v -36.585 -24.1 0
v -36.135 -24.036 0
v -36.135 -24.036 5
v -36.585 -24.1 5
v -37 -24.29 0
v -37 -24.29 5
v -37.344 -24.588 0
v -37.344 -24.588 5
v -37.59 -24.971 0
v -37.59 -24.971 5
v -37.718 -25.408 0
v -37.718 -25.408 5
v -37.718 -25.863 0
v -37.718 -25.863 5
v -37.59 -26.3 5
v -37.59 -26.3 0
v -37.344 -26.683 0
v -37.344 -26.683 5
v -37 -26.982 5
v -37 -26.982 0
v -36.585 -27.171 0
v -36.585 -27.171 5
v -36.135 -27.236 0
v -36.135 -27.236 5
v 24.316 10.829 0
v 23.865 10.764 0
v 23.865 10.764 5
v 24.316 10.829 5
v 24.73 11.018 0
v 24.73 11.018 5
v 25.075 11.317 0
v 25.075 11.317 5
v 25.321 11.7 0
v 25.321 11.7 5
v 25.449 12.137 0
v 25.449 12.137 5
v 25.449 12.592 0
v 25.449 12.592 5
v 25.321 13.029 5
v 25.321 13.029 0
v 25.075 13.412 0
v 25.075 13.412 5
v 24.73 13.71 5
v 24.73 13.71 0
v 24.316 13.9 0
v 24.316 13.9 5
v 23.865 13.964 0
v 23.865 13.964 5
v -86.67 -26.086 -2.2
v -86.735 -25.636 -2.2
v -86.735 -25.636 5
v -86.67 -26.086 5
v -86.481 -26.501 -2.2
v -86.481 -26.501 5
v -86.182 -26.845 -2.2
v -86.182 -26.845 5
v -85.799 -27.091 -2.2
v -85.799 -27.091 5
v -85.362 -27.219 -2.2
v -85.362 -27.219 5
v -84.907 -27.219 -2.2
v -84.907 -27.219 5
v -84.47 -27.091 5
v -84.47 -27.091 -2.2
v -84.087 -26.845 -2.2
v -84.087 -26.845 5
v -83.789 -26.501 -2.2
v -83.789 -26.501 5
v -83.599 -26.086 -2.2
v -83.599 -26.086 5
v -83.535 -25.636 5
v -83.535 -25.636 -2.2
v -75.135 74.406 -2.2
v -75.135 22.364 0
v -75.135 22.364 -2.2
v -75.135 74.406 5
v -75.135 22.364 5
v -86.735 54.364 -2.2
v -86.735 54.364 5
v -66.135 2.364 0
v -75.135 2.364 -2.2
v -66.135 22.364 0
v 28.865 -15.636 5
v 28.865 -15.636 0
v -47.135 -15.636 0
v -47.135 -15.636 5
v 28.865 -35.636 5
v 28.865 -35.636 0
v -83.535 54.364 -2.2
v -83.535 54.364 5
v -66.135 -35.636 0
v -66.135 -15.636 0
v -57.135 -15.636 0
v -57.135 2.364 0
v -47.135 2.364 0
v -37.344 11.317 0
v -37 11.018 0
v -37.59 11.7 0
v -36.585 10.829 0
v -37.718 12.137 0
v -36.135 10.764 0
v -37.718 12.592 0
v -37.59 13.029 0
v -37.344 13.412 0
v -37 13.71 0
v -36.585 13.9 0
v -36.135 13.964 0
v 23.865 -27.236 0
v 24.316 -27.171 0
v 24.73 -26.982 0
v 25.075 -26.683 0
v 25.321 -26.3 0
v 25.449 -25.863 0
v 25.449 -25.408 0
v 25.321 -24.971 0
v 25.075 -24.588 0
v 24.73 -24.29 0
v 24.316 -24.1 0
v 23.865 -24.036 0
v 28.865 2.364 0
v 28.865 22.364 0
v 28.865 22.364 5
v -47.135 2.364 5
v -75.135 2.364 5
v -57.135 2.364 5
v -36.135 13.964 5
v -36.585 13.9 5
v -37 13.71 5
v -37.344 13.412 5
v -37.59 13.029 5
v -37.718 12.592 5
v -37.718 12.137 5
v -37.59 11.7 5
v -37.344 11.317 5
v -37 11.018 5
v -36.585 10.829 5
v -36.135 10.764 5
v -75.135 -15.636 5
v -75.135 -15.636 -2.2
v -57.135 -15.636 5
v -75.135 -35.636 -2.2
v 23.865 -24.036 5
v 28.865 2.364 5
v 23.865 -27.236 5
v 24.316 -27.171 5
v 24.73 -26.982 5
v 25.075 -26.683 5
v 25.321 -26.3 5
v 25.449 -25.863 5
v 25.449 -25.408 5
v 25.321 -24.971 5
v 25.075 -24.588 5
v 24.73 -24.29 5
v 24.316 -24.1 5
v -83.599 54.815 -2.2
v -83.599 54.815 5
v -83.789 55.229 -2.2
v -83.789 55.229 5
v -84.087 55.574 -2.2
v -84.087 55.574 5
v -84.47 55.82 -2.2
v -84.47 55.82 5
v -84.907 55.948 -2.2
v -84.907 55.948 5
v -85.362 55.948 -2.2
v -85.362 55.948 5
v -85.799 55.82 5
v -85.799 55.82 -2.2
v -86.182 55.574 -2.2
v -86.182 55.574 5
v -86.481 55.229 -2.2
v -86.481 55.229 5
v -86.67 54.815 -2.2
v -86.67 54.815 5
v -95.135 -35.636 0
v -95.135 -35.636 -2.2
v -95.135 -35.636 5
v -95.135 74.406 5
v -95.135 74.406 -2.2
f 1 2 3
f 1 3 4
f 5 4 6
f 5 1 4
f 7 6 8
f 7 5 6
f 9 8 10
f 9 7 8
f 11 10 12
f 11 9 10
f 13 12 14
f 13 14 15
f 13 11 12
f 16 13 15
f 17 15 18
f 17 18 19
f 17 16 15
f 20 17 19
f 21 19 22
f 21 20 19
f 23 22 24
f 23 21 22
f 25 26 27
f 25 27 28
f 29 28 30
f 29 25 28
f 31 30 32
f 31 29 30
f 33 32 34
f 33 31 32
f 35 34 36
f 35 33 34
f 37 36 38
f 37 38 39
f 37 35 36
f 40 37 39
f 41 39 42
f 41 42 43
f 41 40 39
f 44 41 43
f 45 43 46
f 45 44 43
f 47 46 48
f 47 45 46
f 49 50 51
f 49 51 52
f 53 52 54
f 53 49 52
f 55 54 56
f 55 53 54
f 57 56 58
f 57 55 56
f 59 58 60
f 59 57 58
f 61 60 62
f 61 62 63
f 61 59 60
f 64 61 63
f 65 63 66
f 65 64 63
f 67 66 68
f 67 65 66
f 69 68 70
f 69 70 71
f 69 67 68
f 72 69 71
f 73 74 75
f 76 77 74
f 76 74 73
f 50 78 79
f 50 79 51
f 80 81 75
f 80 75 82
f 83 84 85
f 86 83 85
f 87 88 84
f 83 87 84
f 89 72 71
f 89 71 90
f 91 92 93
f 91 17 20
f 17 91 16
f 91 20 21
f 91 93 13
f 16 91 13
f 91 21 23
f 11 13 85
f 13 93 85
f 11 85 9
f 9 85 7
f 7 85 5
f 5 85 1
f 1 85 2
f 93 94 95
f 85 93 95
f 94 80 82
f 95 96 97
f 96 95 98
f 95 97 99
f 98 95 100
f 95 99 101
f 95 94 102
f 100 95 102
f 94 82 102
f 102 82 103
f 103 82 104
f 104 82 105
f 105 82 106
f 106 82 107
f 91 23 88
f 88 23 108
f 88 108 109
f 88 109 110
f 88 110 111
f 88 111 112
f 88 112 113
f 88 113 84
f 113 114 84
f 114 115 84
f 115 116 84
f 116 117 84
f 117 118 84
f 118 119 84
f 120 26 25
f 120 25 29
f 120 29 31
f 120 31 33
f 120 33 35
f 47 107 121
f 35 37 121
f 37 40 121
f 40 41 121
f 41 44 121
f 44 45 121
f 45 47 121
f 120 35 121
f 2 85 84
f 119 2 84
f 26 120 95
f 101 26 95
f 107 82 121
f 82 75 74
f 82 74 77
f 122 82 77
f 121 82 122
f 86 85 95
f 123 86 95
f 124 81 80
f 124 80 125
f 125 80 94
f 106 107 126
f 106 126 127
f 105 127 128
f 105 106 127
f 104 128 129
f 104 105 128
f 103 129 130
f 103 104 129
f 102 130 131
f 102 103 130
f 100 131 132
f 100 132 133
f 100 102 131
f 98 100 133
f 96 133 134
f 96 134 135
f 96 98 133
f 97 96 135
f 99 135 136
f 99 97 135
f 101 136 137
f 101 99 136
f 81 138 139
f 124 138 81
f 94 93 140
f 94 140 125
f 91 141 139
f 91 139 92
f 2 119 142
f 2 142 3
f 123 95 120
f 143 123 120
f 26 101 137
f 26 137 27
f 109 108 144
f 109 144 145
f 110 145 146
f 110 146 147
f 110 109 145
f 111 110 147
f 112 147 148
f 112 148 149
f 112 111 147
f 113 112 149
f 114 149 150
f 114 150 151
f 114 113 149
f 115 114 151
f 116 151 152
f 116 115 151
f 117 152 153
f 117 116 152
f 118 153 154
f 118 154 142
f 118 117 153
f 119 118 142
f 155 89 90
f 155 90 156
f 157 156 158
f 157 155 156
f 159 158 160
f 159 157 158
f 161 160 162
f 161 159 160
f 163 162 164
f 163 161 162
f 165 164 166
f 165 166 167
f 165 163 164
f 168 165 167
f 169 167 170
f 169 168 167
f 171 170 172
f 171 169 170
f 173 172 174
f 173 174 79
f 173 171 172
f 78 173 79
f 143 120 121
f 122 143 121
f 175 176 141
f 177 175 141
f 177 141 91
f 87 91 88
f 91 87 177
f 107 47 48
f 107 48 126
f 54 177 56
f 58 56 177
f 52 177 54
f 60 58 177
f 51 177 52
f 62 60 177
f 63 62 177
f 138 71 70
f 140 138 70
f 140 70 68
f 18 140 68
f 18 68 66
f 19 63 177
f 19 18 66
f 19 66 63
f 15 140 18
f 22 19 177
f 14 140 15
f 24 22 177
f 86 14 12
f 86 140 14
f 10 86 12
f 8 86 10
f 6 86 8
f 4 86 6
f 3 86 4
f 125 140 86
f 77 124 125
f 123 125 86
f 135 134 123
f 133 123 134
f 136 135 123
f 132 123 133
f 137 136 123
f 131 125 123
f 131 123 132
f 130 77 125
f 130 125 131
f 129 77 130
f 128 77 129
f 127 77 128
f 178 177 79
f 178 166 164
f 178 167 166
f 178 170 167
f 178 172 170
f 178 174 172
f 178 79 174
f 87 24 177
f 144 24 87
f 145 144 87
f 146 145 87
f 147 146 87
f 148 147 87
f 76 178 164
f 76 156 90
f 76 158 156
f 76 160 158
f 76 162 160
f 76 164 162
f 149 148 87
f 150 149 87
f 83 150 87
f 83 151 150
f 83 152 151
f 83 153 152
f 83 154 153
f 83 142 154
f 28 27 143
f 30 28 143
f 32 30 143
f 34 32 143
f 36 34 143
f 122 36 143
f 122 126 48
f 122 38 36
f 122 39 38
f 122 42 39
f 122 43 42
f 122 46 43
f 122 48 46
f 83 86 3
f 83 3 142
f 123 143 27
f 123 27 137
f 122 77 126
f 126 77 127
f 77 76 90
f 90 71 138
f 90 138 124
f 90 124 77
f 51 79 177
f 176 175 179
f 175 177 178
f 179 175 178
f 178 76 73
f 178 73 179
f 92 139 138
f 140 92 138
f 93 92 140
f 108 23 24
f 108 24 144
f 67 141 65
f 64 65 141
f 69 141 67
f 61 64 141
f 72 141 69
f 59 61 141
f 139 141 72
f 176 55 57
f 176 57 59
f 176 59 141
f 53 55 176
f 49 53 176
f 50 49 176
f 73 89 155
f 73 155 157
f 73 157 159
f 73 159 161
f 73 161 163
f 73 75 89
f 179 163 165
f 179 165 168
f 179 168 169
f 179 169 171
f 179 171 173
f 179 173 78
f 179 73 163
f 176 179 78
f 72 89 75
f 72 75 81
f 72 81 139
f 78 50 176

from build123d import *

# Parameters (mm, degrees)
SKETCH_1_W                  = 76
SKETCH_1_H                  = 20
SKETCH_1_W_2                = 18
SKETCH_1_W_3                = 10
SKETCH_1_H_2                = 18
SKETCH_1_W_4                = 20
SKETCH_1_H_3                = 52.041621827
EXTRUDE_1_DEPTH             = 5
HOLE_WIZARD_3_2_3_2_1_DEPTH = 5
SKETCH_8_W                  = 20
SKETCH_8_H                  = 110.041621827
EXTRUDE_2_DEPTH             = 2.2
HOLE_START                  = -2.2
HOLE_WIZARD_3_2_3_2_3_DEPTH = 7.2
RIB_1_REACH                 = 147.55
SKETCH_11_WALL_W            = 302.364540162
SKETCH_11_WALL_H            = 20
RIB_2_REACH                 = 113.533
SKETCH_12_WALL_W            = 234.330707354
SKETCH_12_WALL_H            = 20


# Read off the part's stored shape, not the designer's step: Ø3.2 (3.2) 直径槽口1, Ø3.2 (3.2) 直径槽口3
with BuildPart() as part:
    # 草图1 → 凸台-拉伸1 (new body)
    with BuildSketch(Plane.XY):
        with Locations((-9.134530028, -25.635533007)):
            Rectangle(SKETCH_1_W, SKETCH_1_H)
        with Locations((-66.134530028, -25.635533007)):
            Rectangle(SKETCH_1_W_2, SKETCH_1_H)
        with Locations((-52.134530028, -25.635533007)):
            Rectangle(SKETCH_1_W_3, SKETCH_1_H)
        with Locations((-66.134530028, 12.364466993)):
            Rectangle(SKETCH_1_W_2, SKETCH_1_H)
        with Locations((-9.134530028, 12.364466993)):
            Rectangle(SKETCH_1_W, SKETCH_1_H)
        with Locations((-52.134530028, 12.364466993)):
            Rectangle(SKETCH_1_W_3, SKETCH_1_H)
        with Locations((-52.134530028, -6.635533007)):
            Rectangle(SKETCH_1_W_3, SKETCH_1_H_2)
        with Locations((-85.134530028, 12.364466993)):
            Rectangle(SKETCH_1_W_4, SKETCH_1_H)
        with Locations((-85.134530028, -6.635533007)):
            Rectangle(SKETCH_1_W_4, SKETCH_1_H_2)
        with Locations((-85.134530028, -25.635533007)):
            Rectangle(SKETCH_1_W_4, SKETCH_1_H)
        with Locations((-85.134530028, 48.385277907)):
            Rectangle(SKETCH_1_W_4, SKETCH_1_H_3)
    extrude(amount=EXTRUDE_1_DEPTH)

    # Ø3.2 (3.2) 直径槽口1 outline → Ø3.2 (3.2) 直径槽口1 (cut)
    with BuildSketch(Plane.XY):
        with BuildLine():
            Line((-36.134530028, 10.764466993), (23.865469972, 10.764466993))
            ThreePointArc((23.865469972, 10.764466993), (25.465469972, 12.364466993), (23.865469972, 13.964466993))
            Line((23.865469972, 13.964466993), (-36.134530028, 13.964466993))
            ThreePointArc((-36.134530028, 13.964466993), (-37.734530028, 12.364466993), (-36.134530028, 10.764466993))
        make_face()
        with BuildLine():
            Line((-36.134530028, -27.235533007), (23.865469972, -27.235533007))
            ThreePointArc((23.865469972, -27.235533007), (25.465469972, -25.635533007), (23.865469972, -24.035533007))
            Line((23.865469972, -24.035533007), (-36.134530028, -24.035533007))
            ThreePointArc((-36.134530028, -24.035533007), (-37.734530028, -25.635533007), (-36.134530028, -27.235533007))
        make_face()
    extrude(amount=HOLE_WIZARD_3_2_3_2_1_DEPTH, mode=Mode.SUBTRACT)

    # 草图8 → 凸台-拉伸2 (add)
    with BuildSketch(Plane(origin=(0, 0, 0), x_dir=(-1, 0, 0), z_dir=(0, 0, -1))):
        with Locations((85.134530028, 19.385277907)):
            Rectangle(SKETCH_8_W, SKETCH_8_H)
    extrude(amount=EXTRUDE_2_DEPTH)

    # Ø3.2 (3.2) 直径槽口3 outline → Ø3.2 (3.2) 直径槽口3 (cut)
    with BuildSketch(Plane.XY.offset(HOLE_START)):
        with BuildLine():
            Line((-83.534530028, -25.635533007), (-83.534530028, 54.364466993))
            ThreePointArc((-83.534530028, 54.364466993), (-85.134530028, 55.964466993), (-86.734530028, 54.364466993))
            Line((-86.734530028, 54.364466993), (-86.734530028, -25.635533007))
            ThreePointArc((-86.734530028, -25.635533007), (-85.134530028, -27.235533007), (-83.534530028, -25.635533007))
        make_face()
    extrude(amount=HOLE_WIZARD_3_2_3_2_3_DEPTH, mode=Mode.SUBTRACT)

    # 草图11 wall → 筋1 (add, up to next)
    with BuildSketch(Plane(origin=(-70.634530028, -35.635533007, -1.1), x_dir=(0.971399006497, 0, 0.237453090477), z_dir=(-0.237453090477, 0, 0.971399006497)), mode=Mode.PRIVATE) as rib_1_sk1:
        with Locations((0, 10)):
            Rectangle(SKETCH_11_WALL_W, SKETCH_11_WALL_H)
    rib_1_tool1 = extrude(rib_1_sk1.sketch, amount=RIB_1_REACH, mode=Mode.PRIVATE) - part.part
    add(rib_1_tool1.solids().sort_by_distance((-70.634530028, -35.635533007, -1.1))[0])

    # 草图12 wall → 筋2 (add, up to next)
    with BuildSketch(Plane(origin=(-70.634530028, 22.364466993, -1.1), x_dir=(0.971399006497, 0, 0.237453090477), z_dir=(0.237453090477, 0, -0.971399006497)), mode=Mode.PRIVATE) as rib_2_sk1:
        with Locations((0, 10)):
            Rectangle(SKETCH_12_WALL_W, SKETCH_12_WALL_H)
    rib_2_tool1 = extrude(rib_2_sk1.sketch, amount=-RIB_2_REACH, mode=Mode.PRIVATE) - part.part
    add(rib_2_tool1.solids().sort_by_distance((-70.634530028, 22.364466993, -1.1))[0])


solid = part.part
